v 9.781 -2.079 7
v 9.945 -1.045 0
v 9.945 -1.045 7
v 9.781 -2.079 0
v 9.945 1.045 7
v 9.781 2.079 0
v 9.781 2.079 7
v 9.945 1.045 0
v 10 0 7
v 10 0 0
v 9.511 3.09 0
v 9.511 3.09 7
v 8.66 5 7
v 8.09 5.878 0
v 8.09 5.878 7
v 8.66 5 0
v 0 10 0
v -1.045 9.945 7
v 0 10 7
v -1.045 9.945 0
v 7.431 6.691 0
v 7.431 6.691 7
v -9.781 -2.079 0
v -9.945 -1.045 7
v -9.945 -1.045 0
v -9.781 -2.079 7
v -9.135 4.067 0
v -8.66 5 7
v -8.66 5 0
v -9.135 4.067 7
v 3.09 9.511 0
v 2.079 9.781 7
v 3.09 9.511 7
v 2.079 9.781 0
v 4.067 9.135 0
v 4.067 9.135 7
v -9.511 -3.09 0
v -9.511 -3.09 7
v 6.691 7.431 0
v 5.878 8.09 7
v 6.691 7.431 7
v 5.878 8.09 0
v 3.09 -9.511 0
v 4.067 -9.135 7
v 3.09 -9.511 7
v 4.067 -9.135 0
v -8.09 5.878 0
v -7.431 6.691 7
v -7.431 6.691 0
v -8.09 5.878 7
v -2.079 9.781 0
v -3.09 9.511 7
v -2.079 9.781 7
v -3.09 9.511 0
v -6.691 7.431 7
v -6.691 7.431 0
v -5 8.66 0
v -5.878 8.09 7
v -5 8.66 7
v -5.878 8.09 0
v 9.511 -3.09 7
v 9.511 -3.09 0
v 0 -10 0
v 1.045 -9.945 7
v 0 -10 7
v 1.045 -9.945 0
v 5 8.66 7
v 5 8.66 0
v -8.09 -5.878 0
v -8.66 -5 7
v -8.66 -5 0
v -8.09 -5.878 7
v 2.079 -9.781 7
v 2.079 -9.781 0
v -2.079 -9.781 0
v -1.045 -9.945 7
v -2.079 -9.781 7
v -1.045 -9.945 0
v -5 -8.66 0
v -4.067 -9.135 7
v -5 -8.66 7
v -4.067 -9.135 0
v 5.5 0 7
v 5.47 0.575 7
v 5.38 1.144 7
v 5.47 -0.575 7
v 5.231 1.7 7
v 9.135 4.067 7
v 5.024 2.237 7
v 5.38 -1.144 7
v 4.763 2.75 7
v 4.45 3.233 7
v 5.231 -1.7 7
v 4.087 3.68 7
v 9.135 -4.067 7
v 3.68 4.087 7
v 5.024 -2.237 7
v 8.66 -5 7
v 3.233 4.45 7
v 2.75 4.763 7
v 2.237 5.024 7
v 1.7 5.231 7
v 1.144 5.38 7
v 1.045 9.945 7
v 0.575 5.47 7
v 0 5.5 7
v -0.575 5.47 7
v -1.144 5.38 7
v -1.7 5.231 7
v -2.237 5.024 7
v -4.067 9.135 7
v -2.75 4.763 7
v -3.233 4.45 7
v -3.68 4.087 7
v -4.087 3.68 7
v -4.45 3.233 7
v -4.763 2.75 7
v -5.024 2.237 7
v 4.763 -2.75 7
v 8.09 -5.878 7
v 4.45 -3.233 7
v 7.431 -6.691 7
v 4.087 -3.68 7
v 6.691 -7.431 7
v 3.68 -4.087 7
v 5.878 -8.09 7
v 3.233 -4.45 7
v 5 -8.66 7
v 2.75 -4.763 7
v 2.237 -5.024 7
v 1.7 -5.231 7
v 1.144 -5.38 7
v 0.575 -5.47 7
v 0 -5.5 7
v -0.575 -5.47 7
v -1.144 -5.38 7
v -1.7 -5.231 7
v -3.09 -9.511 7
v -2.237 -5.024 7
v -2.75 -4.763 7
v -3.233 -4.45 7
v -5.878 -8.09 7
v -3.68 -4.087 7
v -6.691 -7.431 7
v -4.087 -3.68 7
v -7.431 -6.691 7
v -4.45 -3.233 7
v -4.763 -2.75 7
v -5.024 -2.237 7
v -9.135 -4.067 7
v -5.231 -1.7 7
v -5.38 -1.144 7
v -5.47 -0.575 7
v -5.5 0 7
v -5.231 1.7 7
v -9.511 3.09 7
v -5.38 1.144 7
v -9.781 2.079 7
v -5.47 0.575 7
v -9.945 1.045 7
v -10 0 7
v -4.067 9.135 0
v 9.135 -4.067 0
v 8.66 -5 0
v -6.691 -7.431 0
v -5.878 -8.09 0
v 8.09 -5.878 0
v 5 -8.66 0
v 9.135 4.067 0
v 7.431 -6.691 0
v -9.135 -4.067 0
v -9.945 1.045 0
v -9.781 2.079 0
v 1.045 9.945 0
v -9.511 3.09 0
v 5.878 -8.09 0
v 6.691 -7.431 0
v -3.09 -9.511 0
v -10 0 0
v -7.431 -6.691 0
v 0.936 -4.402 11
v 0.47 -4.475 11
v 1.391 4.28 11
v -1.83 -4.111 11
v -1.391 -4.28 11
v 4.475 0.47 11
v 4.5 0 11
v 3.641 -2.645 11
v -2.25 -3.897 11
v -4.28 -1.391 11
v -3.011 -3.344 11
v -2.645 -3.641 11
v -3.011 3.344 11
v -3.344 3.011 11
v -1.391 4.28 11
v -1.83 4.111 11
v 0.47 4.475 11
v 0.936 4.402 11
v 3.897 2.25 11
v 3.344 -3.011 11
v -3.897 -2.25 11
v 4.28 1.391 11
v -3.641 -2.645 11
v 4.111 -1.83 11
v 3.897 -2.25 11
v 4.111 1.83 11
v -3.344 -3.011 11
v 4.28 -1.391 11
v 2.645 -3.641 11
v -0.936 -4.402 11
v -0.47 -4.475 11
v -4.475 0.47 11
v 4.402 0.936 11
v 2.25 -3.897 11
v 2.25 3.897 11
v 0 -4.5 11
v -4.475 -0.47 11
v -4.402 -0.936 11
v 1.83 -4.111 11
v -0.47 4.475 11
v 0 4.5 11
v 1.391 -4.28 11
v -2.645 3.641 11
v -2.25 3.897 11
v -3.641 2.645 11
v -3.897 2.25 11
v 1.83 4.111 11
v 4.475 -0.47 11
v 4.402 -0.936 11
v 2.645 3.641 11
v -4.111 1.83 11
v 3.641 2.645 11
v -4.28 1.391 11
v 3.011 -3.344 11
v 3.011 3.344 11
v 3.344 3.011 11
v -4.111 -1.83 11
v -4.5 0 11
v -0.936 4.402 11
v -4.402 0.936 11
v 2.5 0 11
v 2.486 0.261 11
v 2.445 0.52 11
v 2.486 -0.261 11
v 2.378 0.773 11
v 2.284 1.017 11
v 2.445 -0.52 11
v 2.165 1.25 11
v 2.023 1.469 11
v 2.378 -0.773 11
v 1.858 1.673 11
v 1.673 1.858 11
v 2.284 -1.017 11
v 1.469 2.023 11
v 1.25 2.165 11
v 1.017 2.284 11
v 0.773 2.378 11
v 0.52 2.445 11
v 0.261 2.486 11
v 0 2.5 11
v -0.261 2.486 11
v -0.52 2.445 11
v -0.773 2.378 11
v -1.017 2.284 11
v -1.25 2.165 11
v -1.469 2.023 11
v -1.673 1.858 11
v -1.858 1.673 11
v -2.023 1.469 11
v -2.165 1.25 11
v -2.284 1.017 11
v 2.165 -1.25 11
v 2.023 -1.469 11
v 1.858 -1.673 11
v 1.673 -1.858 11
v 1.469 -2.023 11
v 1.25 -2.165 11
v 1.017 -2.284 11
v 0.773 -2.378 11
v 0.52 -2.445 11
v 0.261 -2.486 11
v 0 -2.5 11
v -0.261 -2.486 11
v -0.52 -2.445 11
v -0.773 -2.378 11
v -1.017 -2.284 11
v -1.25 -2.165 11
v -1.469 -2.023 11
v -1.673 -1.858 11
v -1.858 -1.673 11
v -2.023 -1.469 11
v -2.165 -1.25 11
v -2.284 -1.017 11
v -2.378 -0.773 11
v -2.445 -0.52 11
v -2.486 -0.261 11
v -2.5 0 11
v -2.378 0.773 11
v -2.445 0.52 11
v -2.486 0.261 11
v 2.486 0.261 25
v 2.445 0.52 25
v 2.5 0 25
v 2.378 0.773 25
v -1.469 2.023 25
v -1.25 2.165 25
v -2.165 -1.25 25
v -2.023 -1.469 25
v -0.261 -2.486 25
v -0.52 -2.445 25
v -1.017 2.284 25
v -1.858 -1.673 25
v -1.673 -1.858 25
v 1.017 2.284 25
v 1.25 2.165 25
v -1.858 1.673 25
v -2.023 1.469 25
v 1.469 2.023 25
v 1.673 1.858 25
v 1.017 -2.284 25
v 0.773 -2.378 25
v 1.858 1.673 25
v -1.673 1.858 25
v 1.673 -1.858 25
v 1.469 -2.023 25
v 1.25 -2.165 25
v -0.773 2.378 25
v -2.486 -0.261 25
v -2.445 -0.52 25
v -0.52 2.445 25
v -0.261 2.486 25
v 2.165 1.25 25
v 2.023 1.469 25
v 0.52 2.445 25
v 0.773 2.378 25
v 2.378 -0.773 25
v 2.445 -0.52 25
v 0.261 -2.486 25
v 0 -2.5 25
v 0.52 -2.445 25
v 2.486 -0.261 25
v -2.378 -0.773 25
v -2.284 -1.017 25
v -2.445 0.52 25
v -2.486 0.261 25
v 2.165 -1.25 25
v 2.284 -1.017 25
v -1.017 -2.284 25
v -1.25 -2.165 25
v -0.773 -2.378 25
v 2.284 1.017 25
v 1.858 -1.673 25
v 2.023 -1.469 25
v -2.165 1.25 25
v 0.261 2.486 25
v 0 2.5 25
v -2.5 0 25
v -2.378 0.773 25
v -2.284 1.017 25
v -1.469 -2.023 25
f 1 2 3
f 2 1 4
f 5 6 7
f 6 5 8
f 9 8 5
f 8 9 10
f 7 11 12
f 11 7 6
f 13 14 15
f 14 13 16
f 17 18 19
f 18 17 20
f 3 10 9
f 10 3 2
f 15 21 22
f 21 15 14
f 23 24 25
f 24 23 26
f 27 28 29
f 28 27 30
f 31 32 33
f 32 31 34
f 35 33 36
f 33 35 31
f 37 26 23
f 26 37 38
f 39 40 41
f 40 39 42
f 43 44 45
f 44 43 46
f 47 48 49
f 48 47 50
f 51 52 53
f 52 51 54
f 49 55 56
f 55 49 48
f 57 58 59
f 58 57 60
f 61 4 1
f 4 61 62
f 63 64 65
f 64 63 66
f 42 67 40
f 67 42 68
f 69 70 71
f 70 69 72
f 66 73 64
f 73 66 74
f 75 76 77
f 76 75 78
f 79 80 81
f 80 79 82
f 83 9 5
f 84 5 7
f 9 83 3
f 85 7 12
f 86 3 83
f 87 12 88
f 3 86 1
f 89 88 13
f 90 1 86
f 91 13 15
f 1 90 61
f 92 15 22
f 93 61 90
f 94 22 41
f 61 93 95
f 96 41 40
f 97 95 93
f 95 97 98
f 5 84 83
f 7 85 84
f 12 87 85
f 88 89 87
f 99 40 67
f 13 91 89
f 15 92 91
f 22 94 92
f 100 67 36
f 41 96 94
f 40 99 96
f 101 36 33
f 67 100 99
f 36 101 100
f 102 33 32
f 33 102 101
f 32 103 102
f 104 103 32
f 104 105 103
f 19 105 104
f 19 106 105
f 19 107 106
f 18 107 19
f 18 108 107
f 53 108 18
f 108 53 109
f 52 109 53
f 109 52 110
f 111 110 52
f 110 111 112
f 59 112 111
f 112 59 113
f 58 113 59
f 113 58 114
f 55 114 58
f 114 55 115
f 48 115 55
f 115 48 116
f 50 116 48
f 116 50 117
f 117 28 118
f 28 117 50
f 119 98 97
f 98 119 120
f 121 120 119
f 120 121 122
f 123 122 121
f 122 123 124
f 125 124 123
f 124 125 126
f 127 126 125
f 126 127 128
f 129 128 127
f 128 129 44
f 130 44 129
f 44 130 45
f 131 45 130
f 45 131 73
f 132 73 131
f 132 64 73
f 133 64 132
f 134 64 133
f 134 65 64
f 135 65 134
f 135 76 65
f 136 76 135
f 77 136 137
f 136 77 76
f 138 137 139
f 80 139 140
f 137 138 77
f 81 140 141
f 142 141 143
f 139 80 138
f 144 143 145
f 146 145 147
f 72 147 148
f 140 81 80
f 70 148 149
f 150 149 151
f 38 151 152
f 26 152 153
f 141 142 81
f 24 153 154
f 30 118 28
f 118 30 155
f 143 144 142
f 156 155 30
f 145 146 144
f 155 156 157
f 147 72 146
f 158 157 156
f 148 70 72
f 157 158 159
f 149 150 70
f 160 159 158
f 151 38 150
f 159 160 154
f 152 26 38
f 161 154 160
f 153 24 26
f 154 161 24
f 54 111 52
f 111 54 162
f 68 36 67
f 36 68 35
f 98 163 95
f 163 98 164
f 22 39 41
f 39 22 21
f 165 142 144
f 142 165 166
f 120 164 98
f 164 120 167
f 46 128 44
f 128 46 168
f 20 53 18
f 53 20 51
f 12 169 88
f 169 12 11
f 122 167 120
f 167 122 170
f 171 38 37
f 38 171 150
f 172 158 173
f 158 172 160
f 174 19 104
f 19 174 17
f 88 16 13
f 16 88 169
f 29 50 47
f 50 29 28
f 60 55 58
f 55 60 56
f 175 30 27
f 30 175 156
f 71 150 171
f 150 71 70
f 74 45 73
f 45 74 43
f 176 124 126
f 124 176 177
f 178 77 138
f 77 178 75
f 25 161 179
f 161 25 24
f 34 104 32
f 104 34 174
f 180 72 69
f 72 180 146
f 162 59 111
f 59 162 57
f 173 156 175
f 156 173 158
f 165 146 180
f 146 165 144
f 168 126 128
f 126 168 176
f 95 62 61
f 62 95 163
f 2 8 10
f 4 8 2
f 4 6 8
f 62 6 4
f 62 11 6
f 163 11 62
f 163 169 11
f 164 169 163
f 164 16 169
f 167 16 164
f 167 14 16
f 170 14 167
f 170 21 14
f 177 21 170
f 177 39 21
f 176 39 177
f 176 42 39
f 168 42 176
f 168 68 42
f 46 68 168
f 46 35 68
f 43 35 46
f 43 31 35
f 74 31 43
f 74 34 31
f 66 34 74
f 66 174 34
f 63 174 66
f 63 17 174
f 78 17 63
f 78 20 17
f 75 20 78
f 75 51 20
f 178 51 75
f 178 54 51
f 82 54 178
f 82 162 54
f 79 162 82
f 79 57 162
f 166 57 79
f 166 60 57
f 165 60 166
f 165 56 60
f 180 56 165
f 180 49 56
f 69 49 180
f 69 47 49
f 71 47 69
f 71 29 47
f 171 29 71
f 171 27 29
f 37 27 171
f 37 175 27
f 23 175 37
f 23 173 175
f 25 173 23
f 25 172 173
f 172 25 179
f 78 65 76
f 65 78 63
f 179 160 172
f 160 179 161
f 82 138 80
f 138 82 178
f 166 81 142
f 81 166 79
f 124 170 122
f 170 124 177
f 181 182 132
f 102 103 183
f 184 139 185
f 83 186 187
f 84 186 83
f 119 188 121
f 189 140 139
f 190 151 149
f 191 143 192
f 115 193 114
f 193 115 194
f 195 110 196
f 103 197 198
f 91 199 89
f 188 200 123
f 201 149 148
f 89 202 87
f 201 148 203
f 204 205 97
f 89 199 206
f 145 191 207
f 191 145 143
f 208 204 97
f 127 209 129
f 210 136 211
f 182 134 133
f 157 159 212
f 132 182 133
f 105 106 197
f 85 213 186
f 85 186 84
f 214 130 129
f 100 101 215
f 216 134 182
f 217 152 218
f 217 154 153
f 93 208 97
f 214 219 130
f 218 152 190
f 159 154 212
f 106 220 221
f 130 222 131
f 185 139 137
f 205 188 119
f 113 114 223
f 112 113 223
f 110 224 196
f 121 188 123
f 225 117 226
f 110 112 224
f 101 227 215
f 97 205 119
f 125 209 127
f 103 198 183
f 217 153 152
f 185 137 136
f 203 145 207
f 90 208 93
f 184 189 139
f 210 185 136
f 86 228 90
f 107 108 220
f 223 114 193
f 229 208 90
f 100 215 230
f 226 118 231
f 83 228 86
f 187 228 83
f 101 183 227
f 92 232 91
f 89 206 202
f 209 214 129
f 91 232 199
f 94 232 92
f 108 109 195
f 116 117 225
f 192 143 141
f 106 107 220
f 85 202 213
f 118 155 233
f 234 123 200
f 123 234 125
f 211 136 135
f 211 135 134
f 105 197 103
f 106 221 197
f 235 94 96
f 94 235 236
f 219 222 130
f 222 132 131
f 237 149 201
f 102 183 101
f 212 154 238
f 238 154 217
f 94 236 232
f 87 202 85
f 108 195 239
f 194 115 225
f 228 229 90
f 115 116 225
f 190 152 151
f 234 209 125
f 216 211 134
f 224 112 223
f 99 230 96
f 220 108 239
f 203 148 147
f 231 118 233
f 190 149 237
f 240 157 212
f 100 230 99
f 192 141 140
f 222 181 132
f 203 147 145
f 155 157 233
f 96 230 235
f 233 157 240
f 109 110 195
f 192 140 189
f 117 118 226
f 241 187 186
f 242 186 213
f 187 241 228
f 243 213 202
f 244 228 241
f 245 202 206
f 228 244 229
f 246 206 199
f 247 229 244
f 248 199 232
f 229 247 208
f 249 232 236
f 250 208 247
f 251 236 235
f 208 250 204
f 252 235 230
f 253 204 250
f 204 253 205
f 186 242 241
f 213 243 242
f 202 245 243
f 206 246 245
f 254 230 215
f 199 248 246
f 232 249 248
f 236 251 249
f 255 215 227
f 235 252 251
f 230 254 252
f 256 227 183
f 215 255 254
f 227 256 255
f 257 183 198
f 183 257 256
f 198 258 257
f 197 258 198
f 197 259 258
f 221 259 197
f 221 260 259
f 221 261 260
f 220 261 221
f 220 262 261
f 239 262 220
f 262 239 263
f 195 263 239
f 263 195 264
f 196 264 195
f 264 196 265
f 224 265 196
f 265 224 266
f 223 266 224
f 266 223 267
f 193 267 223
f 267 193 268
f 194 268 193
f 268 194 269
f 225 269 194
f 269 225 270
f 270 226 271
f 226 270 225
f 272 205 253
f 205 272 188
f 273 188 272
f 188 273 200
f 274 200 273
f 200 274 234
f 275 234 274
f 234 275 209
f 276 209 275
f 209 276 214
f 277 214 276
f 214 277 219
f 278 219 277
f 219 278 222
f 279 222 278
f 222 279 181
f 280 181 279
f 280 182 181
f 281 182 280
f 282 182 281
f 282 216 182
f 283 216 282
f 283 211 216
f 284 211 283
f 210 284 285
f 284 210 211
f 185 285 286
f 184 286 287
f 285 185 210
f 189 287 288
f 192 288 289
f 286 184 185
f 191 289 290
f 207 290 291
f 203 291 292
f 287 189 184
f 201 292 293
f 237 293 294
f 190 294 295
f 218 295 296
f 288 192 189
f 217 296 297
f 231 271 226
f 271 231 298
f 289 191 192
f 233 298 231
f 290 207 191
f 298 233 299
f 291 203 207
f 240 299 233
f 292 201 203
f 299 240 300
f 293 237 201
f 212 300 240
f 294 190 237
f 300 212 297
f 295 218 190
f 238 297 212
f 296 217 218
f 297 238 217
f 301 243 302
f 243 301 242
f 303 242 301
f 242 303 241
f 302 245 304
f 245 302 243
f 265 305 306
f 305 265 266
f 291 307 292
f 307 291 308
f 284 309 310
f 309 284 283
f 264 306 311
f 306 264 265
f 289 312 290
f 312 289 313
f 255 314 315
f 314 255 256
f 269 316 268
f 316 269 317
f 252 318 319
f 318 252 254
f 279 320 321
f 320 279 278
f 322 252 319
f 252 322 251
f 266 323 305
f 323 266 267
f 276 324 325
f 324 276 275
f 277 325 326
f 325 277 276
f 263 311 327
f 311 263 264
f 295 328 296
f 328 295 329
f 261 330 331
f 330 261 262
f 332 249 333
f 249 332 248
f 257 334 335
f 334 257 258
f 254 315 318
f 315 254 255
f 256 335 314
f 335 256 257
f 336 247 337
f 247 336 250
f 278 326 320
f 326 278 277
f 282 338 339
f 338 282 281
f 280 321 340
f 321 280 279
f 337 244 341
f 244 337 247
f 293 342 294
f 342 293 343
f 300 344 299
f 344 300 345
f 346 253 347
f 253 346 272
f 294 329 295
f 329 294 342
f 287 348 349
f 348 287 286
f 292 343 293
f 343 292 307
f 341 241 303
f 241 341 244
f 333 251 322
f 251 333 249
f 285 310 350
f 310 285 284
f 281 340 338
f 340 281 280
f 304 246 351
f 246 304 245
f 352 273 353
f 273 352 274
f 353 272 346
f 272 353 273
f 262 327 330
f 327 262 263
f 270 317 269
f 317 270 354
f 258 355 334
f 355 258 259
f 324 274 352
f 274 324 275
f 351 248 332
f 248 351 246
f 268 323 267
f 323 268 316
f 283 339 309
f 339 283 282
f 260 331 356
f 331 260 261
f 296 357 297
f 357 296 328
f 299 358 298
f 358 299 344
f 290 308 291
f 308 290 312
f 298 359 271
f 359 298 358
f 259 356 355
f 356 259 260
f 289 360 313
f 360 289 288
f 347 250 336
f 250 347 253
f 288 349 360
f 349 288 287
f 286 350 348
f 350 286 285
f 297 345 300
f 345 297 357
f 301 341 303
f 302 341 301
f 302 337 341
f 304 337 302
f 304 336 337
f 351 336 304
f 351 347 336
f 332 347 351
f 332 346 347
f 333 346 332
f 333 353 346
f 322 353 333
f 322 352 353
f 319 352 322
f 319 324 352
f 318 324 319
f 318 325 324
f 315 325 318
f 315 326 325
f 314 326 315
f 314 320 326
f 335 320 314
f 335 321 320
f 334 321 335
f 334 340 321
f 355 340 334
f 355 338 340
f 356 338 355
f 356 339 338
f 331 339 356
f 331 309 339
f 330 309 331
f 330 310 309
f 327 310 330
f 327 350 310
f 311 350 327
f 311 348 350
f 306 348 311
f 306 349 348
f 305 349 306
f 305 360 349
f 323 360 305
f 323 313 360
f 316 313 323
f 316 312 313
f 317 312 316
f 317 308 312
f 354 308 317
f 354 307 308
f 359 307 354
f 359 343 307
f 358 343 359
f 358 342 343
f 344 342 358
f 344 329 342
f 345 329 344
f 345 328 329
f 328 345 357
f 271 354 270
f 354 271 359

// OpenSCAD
// Adjustable leveling foot, smooth threaded-shaft representation.
$fn = 60;
eps = 0.02;
shaft_d = 5;
pad_d = 20;
shaft_l = 14;
pad_h = 7;
union() {
    cylinder(d = pad_d, h = pad_h);
    translate([0, 0, pad_h]) cylinder(d1 = pad_d * 0.55, d2 = shaft_d + 4, h = 4);
    translate([0, 0, pad_h + 4]) cylinder(d = shaft_d, h = shaft_l);
}
